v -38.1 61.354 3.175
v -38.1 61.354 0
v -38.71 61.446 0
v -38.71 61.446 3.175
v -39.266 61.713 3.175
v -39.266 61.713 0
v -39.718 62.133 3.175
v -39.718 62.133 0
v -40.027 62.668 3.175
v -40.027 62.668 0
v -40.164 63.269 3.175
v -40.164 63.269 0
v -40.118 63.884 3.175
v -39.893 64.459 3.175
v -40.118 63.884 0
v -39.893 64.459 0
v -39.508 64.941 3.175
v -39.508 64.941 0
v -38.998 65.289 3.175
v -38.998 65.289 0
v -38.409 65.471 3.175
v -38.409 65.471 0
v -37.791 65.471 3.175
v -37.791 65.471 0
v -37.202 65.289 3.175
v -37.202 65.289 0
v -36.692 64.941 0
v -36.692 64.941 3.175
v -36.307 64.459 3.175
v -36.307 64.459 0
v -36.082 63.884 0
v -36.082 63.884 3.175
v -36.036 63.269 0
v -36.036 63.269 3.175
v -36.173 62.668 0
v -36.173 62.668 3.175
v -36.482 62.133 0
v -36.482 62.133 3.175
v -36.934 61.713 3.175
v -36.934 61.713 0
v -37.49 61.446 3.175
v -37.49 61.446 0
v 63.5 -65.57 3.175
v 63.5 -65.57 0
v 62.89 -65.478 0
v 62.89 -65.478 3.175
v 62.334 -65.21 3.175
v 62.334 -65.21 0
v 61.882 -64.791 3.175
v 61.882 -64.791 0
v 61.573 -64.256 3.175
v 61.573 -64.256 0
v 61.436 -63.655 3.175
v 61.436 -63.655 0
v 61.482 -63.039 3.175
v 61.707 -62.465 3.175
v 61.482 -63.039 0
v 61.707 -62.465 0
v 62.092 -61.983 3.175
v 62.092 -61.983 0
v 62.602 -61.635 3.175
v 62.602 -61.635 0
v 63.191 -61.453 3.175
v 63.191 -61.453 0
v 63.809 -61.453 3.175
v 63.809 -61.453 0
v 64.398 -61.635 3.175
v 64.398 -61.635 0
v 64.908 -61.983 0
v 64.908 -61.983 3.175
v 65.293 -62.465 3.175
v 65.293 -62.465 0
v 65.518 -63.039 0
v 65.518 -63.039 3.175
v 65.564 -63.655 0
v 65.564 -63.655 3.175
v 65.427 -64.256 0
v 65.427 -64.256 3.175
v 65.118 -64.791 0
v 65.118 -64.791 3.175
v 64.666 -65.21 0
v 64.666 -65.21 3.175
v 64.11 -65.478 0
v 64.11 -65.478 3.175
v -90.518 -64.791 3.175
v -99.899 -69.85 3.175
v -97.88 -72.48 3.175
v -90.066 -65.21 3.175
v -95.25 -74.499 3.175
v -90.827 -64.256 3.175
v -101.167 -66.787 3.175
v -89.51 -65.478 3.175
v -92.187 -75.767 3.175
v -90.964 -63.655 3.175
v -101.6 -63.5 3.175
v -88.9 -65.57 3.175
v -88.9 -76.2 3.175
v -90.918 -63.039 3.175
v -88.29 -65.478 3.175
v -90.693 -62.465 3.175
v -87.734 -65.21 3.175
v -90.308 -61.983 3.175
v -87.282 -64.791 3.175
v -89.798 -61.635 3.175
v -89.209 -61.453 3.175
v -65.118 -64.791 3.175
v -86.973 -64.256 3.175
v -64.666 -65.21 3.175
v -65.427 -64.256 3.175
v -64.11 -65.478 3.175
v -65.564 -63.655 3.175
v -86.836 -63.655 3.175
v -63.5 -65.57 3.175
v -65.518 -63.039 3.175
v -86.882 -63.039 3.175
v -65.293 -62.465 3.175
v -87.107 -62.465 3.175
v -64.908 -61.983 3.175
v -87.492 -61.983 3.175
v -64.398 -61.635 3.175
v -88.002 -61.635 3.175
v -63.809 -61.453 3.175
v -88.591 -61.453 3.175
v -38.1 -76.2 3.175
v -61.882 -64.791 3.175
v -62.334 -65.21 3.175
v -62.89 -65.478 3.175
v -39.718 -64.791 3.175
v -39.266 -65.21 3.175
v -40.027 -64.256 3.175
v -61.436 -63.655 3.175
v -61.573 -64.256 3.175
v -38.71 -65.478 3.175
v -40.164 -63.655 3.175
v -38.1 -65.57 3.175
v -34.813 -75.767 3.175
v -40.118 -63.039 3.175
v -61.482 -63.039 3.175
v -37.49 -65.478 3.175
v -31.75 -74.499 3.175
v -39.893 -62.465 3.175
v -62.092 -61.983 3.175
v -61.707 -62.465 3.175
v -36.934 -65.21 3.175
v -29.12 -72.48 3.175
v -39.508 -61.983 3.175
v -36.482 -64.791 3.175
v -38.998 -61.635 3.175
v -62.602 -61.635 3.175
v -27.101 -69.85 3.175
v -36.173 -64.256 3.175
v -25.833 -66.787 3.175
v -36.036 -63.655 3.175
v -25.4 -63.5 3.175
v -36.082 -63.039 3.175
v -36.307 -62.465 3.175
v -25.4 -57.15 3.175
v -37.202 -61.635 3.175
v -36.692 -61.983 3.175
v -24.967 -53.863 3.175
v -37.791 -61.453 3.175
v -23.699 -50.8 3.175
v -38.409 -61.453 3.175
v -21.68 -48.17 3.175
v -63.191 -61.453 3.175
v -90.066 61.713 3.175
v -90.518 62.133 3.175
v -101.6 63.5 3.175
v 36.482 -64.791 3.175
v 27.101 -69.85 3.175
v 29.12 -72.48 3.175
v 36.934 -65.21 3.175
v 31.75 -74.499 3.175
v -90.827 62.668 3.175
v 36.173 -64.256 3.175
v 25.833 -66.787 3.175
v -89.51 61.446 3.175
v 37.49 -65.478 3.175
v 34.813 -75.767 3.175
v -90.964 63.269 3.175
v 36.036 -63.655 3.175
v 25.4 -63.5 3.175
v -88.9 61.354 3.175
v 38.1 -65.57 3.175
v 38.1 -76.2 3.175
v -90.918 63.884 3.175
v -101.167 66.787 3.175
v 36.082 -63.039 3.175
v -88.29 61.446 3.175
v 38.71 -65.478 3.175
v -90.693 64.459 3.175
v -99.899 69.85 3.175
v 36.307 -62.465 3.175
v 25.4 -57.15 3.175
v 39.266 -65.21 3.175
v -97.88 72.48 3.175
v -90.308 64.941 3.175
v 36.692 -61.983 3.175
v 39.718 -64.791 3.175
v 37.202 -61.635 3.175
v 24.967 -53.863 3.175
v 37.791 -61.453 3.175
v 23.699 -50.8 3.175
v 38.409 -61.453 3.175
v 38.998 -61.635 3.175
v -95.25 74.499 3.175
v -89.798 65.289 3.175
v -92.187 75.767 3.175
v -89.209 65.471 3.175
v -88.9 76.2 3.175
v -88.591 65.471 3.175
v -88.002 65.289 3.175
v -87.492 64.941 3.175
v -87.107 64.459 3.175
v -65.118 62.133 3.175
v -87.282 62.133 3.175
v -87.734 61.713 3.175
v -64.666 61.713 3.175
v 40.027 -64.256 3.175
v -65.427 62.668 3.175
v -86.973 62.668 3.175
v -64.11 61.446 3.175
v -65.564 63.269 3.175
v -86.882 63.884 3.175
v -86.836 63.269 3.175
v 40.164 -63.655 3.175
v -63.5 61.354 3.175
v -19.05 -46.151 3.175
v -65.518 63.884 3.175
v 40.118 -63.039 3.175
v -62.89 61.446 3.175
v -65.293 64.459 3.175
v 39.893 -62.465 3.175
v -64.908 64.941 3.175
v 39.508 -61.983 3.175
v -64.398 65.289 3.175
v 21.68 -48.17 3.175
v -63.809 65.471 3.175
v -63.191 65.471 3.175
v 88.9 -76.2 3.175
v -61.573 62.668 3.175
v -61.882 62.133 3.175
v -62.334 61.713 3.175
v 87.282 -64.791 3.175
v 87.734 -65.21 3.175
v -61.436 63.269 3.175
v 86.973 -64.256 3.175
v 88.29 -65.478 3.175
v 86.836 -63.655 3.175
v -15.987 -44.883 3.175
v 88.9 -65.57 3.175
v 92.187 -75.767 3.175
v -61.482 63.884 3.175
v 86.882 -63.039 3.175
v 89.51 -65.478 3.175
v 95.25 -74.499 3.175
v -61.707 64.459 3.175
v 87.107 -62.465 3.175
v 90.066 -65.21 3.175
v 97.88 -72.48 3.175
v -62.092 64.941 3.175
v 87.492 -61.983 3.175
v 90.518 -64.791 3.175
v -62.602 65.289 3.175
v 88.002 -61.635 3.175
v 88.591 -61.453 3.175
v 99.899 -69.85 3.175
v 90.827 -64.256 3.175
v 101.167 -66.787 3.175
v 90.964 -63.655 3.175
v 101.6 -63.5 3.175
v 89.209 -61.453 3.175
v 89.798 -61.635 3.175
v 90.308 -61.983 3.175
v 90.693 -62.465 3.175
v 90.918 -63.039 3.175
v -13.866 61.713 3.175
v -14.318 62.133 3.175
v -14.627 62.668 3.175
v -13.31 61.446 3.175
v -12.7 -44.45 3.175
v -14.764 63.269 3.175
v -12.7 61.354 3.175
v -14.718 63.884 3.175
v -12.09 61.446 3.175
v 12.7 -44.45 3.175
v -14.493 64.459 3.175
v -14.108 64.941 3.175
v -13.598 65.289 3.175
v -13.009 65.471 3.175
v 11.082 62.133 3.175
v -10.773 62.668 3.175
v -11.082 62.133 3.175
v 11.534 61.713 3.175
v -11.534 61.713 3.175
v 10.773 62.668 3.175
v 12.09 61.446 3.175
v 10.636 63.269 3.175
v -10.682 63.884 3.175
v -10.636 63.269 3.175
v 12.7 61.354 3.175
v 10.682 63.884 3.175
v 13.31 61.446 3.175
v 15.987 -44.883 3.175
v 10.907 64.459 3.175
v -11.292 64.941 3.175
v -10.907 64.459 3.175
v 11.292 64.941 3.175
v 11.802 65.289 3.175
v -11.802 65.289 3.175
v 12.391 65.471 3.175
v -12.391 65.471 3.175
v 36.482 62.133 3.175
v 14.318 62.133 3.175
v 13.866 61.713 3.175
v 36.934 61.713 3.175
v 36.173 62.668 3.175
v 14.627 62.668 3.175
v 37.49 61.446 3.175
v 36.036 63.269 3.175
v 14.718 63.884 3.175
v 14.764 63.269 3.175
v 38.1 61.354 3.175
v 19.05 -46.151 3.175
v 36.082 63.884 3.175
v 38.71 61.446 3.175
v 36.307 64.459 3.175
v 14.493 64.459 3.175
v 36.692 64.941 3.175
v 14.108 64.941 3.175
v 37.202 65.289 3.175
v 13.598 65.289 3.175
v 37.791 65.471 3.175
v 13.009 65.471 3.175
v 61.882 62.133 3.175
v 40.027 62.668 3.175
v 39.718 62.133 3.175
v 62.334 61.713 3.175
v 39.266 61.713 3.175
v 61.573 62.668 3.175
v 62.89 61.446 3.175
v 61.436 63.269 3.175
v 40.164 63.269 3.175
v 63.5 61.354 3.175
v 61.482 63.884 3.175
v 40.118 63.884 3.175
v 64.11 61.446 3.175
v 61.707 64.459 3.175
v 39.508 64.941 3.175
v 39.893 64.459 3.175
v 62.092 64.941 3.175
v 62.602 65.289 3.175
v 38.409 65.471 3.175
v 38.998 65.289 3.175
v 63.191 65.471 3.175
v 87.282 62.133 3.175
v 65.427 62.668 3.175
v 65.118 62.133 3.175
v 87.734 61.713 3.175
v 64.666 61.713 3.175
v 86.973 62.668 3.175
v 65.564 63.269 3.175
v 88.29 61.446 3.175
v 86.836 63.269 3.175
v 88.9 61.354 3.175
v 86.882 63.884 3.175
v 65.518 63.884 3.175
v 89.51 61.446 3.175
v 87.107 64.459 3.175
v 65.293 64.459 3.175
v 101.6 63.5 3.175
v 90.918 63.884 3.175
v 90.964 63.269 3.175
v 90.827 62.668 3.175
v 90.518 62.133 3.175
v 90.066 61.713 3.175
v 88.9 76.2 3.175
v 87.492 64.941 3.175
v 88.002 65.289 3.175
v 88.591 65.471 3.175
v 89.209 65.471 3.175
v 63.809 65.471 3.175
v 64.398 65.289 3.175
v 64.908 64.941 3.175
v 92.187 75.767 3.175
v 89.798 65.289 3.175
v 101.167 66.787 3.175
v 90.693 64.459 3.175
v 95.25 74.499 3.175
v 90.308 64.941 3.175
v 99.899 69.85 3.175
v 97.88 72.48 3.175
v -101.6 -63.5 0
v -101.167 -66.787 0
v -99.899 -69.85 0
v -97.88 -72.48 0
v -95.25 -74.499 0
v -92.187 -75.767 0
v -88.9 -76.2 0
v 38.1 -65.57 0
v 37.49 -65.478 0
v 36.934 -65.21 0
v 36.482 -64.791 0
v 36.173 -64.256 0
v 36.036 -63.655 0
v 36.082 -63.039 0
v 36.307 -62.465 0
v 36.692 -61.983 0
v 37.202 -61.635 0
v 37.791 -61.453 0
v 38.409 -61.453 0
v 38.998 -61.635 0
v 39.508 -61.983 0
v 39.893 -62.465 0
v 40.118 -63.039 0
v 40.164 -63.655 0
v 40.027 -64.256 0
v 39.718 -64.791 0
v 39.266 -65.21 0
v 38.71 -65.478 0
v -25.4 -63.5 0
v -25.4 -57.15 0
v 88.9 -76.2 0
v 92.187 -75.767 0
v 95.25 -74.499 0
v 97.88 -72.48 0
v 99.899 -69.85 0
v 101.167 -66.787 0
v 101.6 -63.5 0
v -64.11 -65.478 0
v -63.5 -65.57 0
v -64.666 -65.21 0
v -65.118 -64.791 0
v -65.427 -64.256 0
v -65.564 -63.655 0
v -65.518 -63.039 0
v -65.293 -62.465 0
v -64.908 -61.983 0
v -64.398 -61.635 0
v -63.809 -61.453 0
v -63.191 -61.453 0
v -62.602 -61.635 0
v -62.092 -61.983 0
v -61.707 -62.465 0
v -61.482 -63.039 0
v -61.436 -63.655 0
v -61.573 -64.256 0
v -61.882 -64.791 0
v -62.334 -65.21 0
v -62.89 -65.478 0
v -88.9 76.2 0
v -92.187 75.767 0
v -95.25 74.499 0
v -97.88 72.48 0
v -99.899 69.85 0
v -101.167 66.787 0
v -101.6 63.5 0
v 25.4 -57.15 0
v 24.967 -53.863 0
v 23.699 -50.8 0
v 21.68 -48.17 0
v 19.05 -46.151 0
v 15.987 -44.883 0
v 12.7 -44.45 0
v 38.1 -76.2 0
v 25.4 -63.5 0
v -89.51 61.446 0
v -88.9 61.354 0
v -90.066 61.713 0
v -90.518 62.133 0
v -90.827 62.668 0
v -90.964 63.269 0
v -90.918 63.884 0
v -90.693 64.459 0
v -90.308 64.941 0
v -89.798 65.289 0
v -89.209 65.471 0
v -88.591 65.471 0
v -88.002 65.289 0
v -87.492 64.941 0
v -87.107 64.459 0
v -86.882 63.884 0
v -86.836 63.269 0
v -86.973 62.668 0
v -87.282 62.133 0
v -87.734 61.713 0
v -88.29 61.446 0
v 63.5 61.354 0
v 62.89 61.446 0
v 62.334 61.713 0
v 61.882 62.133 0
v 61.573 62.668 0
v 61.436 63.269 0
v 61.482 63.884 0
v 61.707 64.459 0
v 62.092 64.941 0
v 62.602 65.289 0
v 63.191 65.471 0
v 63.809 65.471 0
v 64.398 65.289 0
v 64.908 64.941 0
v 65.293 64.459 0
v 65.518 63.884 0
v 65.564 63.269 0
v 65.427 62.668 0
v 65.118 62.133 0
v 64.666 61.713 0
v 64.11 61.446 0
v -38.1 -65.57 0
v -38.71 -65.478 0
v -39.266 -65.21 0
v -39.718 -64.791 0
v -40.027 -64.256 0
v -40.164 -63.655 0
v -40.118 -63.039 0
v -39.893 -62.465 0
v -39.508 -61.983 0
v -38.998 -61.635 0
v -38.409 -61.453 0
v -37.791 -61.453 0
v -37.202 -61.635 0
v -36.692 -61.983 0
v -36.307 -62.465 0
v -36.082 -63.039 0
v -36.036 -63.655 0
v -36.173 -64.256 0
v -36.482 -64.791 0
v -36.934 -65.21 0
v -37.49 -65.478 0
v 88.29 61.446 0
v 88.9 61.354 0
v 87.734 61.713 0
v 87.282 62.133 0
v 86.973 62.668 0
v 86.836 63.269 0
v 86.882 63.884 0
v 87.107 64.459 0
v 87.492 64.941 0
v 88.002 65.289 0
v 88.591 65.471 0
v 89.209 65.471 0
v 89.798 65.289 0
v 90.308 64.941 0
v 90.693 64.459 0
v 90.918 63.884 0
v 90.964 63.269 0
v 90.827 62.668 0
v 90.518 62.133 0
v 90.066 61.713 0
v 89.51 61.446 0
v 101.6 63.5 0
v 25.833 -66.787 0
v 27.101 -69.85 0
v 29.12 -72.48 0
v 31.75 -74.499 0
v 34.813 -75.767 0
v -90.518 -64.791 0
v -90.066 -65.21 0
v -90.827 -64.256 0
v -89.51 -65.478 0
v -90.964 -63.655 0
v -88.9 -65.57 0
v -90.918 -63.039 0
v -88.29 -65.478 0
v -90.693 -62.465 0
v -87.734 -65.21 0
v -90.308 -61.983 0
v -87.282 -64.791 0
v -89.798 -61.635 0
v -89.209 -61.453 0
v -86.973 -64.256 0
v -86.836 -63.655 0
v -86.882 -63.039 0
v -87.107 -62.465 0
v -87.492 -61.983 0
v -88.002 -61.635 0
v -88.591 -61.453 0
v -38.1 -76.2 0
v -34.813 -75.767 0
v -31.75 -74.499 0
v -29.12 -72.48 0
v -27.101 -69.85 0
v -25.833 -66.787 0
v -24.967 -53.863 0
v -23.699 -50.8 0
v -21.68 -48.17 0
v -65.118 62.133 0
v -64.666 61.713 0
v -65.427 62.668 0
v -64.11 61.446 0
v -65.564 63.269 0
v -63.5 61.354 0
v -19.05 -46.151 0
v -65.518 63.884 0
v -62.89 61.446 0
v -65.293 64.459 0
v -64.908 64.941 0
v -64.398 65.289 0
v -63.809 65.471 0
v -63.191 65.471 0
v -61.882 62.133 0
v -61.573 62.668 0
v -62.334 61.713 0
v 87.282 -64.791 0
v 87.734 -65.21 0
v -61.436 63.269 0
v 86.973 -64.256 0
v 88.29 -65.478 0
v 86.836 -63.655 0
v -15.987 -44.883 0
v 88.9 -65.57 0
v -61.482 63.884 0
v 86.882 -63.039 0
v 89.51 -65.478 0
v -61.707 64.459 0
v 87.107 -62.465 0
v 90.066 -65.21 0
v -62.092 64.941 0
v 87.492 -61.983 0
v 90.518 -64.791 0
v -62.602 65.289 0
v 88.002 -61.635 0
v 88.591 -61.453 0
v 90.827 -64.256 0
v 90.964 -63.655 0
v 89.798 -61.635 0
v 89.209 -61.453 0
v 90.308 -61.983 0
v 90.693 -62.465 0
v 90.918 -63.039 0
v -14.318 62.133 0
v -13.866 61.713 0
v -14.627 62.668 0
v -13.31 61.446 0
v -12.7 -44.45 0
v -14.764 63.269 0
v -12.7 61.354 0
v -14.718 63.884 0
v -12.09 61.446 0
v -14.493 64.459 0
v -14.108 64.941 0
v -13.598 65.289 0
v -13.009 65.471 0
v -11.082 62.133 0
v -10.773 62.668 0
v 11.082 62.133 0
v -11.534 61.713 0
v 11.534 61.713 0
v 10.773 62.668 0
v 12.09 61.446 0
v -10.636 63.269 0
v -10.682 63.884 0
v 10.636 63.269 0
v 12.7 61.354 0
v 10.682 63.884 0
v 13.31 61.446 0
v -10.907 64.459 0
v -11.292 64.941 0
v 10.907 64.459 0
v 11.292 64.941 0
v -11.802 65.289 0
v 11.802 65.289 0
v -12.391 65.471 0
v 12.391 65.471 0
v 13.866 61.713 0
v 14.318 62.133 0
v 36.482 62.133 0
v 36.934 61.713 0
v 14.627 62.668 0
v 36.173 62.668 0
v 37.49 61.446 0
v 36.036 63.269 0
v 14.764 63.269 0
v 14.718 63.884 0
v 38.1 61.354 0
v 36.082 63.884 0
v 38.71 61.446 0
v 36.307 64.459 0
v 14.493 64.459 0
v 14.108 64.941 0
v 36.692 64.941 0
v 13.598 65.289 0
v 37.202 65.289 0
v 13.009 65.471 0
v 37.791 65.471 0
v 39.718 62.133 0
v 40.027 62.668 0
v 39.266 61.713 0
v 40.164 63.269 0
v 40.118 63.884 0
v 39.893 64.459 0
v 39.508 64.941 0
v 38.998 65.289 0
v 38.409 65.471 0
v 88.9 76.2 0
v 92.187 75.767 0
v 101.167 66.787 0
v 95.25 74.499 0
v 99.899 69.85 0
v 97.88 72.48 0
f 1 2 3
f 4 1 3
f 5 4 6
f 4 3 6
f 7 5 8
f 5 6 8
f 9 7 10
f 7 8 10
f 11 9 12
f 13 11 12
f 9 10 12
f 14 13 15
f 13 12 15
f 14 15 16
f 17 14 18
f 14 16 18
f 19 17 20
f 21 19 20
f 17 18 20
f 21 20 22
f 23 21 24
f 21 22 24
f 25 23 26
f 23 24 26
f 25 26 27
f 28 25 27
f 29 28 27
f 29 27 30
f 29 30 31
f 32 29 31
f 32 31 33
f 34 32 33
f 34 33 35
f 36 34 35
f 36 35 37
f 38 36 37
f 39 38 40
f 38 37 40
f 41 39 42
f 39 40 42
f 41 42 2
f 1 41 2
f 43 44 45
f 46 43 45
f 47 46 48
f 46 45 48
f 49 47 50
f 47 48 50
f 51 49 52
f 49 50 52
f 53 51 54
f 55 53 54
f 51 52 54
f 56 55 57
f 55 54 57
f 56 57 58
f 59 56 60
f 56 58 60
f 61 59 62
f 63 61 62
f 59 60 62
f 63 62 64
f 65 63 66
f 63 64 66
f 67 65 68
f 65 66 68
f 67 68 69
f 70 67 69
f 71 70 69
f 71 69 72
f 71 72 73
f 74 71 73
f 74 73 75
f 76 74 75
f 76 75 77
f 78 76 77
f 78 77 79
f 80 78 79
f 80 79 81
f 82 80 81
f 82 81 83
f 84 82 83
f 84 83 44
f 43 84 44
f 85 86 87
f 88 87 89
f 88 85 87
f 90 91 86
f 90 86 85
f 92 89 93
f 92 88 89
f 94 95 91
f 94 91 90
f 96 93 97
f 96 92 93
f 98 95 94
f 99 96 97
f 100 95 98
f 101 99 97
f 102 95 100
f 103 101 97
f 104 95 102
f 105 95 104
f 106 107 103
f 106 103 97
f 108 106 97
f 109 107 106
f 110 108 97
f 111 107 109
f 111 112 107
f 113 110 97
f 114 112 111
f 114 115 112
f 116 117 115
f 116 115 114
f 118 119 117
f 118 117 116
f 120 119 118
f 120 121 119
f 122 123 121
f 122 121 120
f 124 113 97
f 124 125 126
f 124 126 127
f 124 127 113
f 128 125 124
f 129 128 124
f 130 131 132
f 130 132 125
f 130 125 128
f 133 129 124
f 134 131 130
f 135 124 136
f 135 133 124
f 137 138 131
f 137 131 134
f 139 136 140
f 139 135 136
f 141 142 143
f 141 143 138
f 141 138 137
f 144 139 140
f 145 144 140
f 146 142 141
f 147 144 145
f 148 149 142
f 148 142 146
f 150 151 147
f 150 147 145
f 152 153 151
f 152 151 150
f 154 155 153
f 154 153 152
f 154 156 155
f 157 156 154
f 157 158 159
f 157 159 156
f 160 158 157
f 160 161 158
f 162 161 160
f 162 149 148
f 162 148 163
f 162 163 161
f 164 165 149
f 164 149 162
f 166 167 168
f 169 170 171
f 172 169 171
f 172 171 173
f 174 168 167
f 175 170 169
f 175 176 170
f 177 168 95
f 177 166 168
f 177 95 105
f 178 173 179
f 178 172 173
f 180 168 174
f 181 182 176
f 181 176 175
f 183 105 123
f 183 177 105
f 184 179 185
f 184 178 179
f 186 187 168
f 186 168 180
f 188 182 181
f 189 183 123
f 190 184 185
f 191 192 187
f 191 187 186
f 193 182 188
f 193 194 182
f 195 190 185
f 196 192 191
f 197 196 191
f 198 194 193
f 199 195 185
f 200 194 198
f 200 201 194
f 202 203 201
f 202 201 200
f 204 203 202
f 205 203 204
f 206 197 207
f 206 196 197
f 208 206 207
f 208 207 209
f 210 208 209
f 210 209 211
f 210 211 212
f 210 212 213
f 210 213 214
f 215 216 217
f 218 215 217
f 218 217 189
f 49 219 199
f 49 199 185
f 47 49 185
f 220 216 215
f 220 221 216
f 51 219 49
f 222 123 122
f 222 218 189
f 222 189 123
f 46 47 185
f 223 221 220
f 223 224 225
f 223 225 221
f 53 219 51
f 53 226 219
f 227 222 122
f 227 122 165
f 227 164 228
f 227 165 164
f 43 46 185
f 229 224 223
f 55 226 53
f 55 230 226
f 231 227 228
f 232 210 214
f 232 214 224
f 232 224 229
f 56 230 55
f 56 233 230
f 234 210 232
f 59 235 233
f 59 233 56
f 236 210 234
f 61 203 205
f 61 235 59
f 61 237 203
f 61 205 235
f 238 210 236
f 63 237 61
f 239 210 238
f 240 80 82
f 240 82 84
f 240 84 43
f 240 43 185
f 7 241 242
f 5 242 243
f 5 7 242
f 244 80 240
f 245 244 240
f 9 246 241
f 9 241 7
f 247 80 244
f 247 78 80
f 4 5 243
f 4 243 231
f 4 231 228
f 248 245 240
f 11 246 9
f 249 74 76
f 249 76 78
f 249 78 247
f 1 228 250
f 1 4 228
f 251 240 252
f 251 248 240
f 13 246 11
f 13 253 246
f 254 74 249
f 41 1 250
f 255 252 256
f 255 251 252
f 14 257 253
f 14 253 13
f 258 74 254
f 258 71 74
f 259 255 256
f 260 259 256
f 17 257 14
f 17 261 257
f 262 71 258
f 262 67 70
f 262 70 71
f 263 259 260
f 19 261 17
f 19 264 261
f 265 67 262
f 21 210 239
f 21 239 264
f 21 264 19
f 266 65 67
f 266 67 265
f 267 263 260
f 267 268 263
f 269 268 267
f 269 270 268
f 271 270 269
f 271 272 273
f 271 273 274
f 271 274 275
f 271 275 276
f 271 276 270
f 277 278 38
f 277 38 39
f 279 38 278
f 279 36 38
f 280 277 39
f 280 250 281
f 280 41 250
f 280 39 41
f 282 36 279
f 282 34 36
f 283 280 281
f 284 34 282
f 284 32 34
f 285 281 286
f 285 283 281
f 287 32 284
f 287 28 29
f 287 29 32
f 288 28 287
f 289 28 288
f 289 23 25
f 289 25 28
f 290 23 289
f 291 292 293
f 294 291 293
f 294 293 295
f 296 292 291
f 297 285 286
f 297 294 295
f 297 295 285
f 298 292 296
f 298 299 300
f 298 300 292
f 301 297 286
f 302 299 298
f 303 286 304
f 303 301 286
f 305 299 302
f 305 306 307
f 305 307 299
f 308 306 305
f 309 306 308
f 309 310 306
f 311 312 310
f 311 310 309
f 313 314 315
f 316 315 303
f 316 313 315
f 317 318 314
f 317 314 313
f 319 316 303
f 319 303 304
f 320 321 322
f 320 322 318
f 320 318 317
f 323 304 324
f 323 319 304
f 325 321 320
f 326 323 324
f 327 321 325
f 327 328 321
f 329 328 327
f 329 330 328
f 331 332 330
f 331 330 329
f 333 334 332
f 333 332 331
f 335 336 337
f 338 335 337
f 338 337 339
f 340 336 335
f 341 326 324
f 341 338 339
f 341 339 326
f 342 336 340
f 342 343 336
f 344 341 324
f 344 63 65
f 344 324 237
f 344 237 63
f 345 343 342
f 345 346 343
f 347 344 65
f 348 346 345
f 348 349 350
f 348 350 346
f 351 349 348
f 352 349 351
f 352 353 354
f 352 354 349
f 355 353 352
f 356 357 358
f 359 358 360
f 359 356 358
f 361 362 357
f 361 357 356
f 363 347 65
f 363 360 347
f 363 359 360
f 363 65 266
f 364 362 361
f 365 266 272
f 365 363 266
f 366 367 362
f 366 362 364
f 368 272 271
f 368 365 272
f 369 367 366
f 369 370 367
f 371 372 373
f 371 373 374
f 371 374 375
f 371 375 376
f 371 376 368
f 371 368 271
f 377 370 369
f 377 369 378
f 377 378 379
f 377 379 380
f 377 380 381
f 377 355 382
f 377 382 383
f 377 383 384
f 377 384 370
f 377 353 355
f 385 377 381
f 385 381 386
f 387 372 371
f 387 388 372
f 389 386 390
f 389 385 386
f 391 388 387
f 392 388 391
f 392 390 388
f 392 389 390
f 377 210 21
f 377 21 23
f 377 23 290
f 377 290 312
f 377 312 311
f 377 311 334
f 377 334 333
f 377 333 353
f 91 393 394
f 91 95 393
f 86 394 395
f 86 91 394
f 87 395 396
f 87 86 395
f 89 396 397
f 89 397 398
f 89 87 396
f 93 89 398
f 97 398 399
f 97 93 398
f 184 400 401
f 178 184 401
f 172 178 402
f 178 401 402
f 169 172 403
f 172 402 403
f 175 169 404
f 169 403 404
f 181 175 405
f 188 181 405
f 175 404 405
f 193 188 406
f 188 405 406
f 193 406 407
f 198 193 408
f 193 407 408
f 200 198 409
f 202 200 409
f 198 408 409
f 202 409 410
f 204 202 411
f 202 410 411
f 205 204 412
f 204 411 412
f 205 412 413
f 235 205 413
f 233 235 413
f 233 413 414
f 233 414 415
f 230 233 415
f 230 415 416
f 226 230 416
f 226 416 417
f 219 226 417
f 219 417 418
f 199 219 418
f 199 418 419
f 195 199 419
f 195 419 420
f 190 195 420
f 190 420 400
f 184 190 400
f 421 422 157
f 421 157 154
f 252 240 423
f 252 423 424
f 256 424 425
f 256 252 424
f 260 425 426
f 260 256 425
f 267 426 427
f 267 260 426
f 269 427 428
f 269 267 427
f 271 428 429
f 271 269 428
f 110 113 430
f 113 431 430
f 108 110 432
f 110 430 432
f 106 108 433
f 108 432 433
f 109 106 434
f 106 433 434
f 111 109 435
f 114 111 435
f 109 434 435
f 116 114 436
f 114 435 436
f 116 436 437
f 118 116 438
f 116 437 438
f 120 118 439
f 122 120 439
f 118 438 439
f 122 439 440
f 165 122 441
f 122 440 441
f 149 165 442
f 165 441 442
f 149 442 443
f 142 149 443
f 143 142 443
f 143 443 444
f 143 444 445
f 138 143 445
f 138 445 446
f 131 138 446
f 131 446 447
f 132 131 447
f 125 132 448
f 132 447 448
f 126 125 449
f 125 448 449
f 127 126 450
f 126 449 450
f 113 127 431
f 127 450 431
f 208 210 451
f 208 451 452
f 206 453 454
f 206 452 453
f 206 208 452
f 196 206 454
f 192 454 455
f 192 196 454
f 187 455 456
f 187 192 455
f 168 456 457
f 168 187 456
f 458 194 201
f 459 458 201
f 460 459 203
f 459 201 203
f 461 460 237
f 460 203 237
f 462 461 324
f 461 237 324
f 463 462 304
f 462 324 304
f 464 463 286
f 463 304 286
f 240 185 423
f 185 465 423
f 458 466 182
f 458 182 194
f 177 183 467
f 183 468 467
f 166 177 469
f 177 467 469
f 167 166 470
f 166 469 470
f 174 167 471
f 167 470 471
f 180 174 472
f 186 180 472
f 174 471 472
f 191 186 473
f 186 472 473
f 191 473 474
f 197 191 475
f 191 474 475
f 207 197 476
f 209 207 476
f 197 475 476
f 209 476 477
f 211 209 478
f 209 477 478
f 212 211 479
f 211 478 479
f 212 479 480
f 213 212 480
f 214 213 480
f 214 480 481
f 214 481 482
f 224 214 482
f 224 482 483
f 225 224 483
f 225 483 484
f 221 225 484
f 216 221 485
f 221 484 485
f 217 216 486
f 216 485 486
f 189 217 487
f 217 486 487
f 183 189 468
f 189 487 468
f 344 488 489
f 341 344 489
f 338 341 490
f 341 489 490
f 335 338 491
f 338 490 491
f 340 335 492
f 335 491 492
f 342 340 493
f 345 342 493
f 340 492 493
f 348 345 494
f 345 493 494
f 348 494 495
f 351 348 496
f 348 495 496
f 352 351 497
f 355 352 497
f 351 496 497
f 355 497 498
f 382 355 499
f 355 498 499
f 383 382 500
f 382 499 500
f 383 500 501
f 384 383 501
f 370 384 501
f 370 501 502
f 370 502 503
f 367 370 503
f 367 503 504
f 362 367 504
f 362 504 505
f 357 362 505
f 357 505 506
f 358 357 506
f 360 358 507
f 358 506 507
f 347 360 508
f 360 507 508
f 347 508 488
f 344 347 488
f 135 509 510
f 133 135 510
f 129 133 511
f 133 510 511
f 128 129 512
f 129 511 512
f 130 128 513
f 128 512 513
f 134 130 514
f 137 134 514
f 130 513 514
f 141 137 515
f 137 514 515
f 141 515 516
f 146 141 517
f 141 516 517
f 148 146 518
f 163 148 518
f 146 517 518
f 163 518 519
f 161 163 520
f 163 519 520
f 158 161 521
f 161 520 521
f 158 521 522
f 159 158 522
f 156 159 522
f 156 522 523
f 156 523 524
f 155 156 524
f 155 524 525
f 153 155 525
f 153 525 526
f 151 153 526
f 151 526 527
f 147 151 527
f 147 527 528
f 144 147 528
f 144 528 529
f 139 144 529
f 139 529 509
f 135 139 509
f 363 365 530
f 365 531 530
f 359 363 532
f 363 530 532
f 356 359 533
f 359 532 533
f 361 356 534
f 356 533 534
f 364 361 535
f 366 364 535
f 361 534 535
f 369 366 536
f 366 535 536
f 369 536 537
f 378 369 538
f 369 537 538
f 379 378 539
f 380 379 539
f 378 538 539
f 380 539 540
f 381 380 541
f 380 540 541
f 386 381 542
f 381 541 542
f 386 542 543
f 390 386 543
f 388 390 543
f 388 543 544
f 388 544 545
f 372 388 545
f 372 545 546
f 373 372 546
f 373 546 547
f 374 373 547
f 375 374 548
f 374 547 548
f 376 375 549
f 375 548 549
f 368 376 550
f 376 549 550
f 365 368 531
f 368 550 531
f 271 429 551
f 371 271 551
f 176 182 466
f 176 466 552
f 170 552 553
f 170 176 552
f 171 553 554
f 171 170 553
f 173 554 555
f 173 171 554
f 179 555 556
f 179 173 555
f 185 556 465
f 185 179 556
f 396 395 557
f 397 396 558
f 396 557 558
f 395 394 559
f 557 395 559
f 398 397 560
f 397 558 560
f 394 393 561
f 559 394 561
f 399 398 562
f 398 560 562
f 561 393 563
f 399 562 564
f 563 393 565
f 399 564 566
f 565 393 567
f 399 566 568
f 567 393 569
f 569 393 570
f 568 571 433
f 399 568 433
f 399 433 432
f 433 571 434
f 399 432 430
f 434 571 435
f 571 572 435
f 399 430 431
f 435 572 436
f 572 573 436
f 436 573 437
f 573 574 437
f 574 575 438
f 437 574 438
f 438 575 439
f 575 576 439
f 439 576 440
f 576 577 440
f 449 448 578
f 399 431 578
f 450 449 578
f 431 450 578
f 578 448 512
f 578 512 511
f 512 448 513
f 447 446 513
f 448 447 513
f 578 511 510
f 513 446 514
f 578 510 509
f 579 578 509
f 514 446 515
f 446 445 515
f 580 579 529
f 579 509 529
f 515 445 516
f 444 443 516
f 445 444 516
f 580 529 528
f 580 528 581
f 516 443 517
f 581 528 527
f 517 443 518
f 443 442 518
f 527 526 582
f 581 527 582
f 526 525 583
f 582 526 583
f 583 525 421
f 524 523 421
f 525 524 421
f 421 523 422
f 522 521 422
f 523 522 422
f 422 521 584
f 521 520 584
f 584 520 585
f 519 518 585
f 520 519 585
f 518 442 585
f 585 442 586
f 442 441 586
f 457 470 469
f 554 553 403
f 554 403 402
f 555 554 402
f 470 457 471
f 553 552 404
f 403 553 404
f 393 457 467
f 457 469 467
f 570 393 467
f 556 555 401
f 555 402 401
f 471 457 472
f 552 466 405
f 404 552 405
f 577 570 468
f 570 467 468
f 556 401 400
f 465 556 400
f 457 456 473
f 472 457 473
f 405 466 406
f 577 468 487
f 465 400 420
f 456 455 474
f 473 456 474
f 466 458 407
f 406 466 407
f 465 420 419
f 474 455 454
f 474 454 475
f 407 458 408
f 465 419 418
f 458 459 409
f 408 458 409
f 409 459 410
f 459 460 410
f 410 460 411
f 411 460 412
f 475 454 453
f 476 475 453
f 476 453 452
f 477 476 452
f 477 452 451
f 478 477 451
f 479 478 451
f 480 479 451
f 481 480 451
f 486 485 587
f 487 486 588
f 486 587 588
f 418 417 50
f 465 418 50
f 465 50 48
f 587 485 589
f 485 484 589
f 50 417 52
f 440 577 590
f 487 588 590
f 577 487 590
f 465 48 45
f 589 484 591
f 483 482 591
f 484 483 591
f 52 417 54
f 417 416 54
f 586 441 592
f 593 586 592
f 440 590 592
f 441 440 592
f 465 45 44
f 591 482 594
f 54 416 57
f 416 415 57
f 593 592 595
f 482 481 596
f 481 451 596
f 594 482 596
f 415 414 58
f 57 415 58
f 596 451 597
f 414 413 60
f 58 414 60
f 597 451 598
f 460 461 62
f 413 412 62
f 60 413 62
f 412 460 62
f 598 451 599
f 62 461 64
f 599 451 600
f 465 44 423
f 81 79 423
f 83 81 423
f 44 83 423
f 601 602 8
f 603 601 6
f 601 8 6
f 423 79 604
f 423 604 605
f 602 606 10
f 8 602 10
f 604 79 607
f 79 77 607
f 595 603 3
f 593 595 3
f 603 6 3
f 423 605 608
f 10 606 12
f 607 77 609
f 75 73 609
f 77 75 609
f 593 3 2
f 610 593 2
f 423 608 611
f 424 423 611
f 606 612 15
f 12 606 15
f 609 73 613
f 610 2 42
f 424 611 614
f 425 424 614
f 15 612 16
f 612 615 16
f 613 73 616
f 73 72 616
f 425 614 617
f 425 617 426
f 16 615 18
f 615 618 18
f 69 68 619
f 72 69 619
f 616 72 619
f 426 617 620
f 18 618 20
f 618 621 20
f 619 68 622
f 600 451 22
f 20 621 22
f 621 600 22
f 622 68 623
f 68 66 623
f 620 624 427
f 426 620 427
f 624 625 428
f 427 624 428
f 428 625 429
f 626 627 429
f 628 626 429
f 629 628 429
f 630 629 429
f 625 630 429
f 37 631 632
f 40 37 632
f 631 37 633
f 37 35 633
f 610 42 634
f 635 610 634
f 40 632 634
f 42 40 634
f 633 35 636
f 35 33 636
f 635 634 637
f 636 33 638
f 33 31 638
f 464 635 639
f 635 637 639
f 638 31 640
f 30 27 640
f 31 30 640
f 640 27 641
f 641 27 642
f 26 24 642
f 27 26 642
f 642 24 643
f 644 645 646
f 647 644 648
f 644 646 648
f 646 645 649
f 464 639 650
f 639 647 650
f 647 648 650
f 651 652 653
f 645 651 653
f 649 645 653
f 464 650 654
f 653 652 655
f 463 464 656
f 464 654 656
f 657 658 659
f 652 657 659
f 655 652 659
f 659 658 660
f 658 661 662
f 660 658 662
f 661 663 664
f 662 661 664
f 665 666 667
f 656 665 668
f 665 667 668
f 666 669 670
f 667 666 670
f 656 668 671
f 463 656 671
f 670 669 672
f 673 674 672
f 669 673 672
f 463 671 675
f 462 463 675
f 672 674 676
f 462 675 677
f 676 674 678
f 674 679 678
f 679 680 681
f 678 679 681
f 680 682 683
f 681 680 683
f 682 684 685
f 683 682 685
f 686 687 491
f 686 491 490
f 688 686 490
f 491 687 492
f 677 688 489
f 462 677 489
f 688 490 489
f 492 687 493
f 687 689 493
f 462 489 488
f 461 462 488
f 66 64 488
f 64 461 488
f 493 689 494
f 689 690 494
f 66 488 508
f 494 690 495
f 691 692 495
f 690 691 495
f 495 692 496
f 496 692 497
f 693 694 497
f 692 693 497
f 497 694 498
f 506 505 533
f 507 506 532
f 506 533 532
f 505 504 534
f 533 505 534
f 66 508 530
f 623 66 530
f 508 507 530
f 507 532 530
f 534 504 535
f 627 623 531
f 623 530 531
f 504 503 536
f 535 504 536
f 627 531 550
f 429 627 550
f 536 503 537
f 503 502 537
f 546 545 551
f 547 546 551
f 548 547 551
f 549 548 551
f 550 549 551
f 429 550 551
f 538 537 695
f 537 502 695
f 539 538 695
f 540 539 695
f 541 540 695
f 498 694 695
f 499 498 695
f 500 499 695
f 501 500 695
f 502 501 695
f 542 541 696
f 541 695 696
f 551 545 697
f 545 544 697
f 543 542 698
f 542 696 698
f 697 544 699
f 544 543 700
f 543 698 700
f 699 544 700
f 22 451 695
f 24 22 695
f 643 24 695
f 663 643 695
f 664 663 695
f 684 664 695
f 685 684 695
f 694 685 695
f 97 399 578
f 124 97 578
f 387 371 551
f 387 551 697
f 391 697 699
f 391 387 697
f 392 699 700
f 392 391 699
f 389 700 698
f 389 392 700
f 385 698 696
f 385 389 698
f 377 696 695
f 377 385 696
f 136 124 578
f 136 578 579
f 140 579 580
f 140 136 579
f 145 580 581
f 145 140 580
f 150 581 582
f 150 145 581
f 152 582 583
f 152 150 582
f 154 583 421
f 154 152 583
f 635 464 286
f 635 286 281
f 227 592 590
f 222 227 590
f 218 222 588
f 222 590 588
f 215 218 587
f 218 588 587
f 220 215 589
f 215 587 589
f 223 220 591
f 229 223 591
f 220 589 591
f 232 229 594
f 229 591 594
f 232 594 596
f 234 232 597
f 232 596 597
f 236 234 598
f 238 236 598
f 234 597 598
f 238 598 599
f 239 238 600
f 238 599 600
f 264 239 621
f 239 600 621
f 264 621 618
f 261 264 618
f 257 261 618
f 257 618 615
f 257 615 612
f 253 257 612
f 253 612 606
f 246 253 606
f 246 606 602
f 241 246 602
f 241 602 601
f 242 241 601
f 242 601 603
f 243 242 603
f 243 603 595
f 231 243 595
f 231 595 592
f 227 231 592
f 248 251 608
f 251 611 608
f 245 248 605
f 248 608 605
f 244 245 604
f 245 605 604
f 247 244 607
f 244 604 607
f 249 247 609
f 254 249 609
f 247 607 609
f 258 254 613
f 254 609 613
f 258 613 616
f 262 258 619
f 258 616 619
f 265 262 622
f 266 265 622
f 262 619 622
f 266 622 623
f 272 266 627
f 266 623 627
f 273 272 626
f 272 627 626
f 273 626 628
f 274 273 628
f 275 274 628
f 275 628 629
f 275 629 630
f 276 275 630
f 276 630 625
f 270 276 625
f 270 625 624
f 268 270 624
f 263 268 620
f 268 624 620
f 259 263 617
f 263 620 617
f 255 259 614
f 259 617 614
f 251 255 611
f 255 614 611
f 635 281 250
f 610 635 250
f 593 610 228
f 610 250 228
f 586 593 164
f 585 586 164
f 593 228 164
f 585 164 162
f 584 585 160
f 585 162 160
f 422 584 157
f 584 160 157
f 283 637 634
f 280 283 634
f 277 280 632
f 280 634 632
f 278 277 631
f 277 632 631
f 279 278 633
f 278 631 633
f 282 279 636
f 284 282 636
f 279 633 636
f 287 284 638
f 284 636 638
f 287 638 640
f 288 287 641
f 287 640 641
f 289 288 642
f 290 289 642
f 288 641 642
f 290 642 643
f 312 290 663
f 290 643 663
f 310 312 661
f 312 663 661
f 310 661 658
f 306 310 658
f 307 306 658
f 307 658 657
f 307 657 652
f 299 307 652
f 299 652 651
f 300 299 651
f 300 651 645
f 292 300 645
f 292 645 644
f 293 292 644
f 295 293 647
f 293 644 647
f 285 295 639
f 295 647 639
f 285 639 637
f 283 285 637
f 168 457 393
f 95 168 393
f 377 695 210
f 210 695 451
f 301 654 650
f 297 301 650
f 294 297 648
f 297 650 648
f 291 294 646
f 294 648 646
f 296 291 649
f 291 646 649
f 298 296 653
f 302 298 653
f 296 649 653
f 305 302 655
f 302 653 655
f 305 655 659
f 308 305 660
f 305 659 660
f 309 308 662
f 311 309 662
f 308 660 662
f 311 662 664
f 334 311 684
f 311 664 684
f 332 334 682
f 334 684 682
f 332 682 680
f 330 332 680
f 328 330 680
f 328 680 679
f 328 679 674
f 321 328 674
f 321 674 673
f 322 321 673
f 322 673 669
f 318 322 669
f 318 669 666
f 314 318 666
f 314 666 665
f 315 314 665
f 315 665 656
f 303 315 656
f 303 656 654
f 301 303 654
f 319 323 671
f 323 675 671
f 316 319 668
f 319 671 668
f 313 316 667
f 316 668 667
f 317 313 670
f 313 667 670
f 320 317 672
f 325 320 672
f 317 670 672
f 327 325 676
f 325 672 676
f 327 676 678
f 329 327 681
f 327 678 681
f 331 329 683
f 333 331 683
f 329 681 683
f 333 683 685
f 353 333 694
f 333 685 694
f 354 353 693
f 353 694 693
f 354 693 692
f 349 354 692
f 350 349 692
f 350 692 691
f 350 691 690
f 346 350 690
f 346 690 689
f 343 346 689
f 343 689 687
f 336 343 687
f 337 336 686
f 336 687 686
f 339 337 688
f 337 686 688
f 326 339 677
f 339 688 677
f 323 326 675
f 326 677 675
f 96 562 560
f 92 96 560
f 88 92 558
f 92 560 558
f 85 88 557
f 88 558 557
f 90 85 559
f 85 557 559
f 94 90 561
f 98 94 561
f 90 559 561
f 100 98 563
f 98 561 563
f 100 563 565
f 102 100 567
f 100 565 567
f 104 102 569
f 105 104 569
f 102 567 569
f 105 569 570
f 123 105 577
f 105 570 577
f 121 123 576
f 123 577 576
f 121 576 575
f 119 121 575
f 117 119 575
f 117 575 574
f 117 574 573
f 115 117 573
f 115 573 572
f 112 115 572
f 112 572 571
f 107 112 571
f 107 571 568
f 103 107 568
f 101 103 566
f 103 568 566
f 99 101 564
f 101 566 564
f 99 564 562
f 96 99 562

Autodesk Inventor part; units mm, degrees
ref_plane "YZ Plane" through (0, 0, 0) normal (1, 0, 0) x (0, 1, 0)
ref_plane "XZ Plane" through (0, 0, 0) normal (0, 1, 0) x (-1, 0, 0)
ref_plane "XY Plane" through (0, 0, 0) normal (0, 0, 1) x (1, 0, 0)
sketch "Sketch1" plane through (0, 0, 0) normal (0, 0, 1) x (1, 0, 0)
  line L0 (-101.6, -76.2) -> (101.6, -76.2)
  line L1 (101.6, -76.2) -> (101.6, 76.2)
  line L2 (101.6, 76.2) -> (-101.6, 76.2)
  line L3 (-101.6, 76.2) -> (-101.6, -76.2)
  line L4 (-101.6, -76.2) -> (101.6, 76.2) construction
  line L5 (101.6, -76.2) -> (-101.6, 76.2) construction
  point P0 (0, 0)
  dimension "d0" = 152.4
  dimension "d1" = 203.2
extrude "Extrusion1" add sketch "Sketch1" along normal blind 3.175
fillet "Fillet1" radius 12.7 4 edges at (101.6, 76.2, 1.5875) (101.6, -76.2, 1.5875) (-101.6, -76.2, 1.5875) (-101.6, 76.2, 1.5875)
sketch "Sketch2" plane through (0, 0, 3.175) normal (0, 0, 1) x (1, 0, 0)
  line L0 (101.6, -73.1012) -> (-101.6, -73.1012) projected
  line L1 (101.6, -73.1012) -> (101.6, -53.8988) projected
  line L2 (-101.6, -53.8988) -> (101.6, -53.8988) projected
  line L3 (-97.2058, -18.9992) -> (-97.2058, 44.2468) projected
  line L4 (-97.2058, -18.9992) -> (-85.1719, -18.9992) projected
  line L5 (-85.1719, -18.9992) -> (-31.877, 34.2957) projected
  line L6 (-31.877, 34.2957) -> (-31.877, 46.3296) projected
  line L7 (-95.123, 46.3296) -> (-31.877, 46.3296) projected
  line L8 (-101.6, 63.5) -> (-101.6, -63.5) projected
  line L9 (-88.9, -76.2) -> (88.9, -76.2) projected
  arc A0 (-97.2058, 44.2468) -> (-95.123, 46.3296) centre (-97.1931, 46.3169) ccw projected
  circle A1 centre (-74.2399, 4.9487) radius 2.0701 projected
  circle A2 centre (-56.2794, 41.3242) radius 2.4892 projected
  circle A3 centre (-92.2004, 5.4032) radius 2.4892 projected
  circle A4 centre (-74.2399, 23.3637) radius 14.2875 projected
  circle A5 centre (-74.2399, 41.7787) radius 2.0701 projected
  circle A6 centre (-91.7406, 40.8644) radius 3.7211 projected
  circle A7 centre (-55.8249, 23.3637) radius 2.0701 projected
  circle A8 centre (-92.6549, 23.3637) radius 2.0701 projected
  circle A9 centre (-88.9, -63.5) radius 2.0701 projected
  circle A10 centre (-63.5, -63.5) radius 2.0701 projected
  circle A11 centre (-38.1, -63.5) radius 2.0701 projected
  circle A12 centre (-12.7, -63.5) radius 2.0701 projected
  circle A13 centre (12.7, -63.5) radius 2.0701 projected
  circle A14 centre (38.1, -63.5) radius 2.0701 projected
  circle A15 centre (63.5, -63.5) radius 2.0701 projected
  circle A16 centre (88.9, -63.5) radius 2.0701 projected
  arc A17 (65.5687, 63.5) -> (61.4313, 63.5) centre (63.5, 63.4238) ccw projected
  line L10 (61.4313, 63.5) -> (40.1687, 63.5) projected
  arc A18 (40.1687, 63.5) -> (36.0313, 63.5) centre (38.1, 63.4238) ccw projected
  line L11 (36.0313, 63.5) -> (14.7687, 63.5) projected
  arc A19 (14.7687, 63.5) -> (10.6313, 63.5) centre (12.7, 63.4238) ccw projected
  line L12 (10.6313, 63.5) -> (-10.6313, 63.5) projected
  arc A20 (-10.6313, 63.5) -> (-14.7687, 63.5) centre (-12.7, 63.4238) ccw projected
  line L13 (-14.7687, 63.5) -> (-36.0313, 63.5) projected
  arc A21 (-36.0313, 63.5) -> (-40.1687, 63.5) centre (-38.1, 63.4238) ccw projected
  line L14 (-40.1687, 63.5) -> (-61.4313, 63.5) projected
  arc A22 (-61.4313, 63.5) -> (-65.5687, 63.5) centre (-63.5, 63.4238) ccw projected
  line L15 (-65.5687, 63.5) -> (-86.8313, 63.5) projected
  arc A23 (-86.8313, 63.5) -> (-90.9687, 63.5) centre (-88.9, 63.4238) ccw projected
  line L16 (-90.9687, 63.5) -> (-101.6, 63.5) projected
  line L17 (-101.6, 76.1238) -> (-101.6, 63.5) projected
  line L18 (-101.6, 76.1238) -> (101.6, 76.1238) projected
  line L19 (101.6, 63.5) -> (101.6, 76.1238) projected
  line L20 (101.6, 63.5) -> (90.9687, 63.5) projected
  arc A24 (90.9687, 63.5) -> (86.8313, 63.5) centre (88.9, 63.4238) ccw projected
  line L21 (86.8313, 63.5) -> (65.5687, 63.5) projected
  line L22 (-101.6, -53.8988) -> (-101.6, -73.1012) projected
  point P0 (0, 0)
  point P1 (-88.9, -63.5)
  point P2 (-63.5, -63.5)
  point P3 (-38.1, -63.5)
  point P4 (-12.7, -63.5)
  point P5 (12.7, -63.5)
  point P6 (38.1, -63.5)
  point P7 (63.5, -63.5)
  point P8 (88.9, -63.5)
  dimension "d12" = 12.7
  dimension "d13" = 12.7
  dimension "d16" = 25.4
hole "Hole1" at (-63.5, -63.5, 3.175) at (-88.9, -63.5, 3.175) at (-38.1, -63.5, 3.175) at (-12.7, -63.5, 3.175) at (12.7, -63.5, 3.175) at (38.1, -63.5, 3.175) at (63.5, -63.5, 3.175) at (88.9, -63.5, 3.175) at (-88.9, 63.4238, 3.175) at (-63.5, 63.4238, 3.175) at (-38.1, 63.4238, 3.175) at (-12.7, 63.4238, 3.175) at (12.7, 63.4238, 3.175) at (38.1, 63.4238, 3.175) at (63.5, 63.4238, 3.175) at (88.9, 63.4238, 3.175) direction (0, 0, -1) diameter 4.1402 end through all
sketch "Sketch3" plane through (0, 0, 0) normal (0, 0, -1) x (-1, 0, 0)
  line L0 (88.9, -76.2) -> (-88.9, -76.2) projected
  line L1 (25.4, -76.2) -> (-25.4, -76.2)
  line L2 (-25.4, -76.2) -> (-25.4, -44.45)
  line L3 (-25.4, -44.45) -> (25.4, -44.45)
  line L4 (25.4, -44.45) -> (25.4, -76.2)
  line L5 (101.6, 63.5) -> (101.6, -63.5) projected
  point P0 (0, 0)
  dimension "d21" = 50.8
  dimension "d22" = 31.75
  dimension "d23" = 76.2
extrude "Extrusion2" cut sketch "Sketch3" against normal through all
fillet "Fillet2" radius 12.7 4 edges at (-25.4, -76.2, 1.5875) (-25.4, -44.45, 1.5875) (25.4, -44.45, 1.5875) (25.4, -76.2, 1.5875)
properties part number "C12_TK_UpperFrameSupport" material "Polycarbonate, Clear"
